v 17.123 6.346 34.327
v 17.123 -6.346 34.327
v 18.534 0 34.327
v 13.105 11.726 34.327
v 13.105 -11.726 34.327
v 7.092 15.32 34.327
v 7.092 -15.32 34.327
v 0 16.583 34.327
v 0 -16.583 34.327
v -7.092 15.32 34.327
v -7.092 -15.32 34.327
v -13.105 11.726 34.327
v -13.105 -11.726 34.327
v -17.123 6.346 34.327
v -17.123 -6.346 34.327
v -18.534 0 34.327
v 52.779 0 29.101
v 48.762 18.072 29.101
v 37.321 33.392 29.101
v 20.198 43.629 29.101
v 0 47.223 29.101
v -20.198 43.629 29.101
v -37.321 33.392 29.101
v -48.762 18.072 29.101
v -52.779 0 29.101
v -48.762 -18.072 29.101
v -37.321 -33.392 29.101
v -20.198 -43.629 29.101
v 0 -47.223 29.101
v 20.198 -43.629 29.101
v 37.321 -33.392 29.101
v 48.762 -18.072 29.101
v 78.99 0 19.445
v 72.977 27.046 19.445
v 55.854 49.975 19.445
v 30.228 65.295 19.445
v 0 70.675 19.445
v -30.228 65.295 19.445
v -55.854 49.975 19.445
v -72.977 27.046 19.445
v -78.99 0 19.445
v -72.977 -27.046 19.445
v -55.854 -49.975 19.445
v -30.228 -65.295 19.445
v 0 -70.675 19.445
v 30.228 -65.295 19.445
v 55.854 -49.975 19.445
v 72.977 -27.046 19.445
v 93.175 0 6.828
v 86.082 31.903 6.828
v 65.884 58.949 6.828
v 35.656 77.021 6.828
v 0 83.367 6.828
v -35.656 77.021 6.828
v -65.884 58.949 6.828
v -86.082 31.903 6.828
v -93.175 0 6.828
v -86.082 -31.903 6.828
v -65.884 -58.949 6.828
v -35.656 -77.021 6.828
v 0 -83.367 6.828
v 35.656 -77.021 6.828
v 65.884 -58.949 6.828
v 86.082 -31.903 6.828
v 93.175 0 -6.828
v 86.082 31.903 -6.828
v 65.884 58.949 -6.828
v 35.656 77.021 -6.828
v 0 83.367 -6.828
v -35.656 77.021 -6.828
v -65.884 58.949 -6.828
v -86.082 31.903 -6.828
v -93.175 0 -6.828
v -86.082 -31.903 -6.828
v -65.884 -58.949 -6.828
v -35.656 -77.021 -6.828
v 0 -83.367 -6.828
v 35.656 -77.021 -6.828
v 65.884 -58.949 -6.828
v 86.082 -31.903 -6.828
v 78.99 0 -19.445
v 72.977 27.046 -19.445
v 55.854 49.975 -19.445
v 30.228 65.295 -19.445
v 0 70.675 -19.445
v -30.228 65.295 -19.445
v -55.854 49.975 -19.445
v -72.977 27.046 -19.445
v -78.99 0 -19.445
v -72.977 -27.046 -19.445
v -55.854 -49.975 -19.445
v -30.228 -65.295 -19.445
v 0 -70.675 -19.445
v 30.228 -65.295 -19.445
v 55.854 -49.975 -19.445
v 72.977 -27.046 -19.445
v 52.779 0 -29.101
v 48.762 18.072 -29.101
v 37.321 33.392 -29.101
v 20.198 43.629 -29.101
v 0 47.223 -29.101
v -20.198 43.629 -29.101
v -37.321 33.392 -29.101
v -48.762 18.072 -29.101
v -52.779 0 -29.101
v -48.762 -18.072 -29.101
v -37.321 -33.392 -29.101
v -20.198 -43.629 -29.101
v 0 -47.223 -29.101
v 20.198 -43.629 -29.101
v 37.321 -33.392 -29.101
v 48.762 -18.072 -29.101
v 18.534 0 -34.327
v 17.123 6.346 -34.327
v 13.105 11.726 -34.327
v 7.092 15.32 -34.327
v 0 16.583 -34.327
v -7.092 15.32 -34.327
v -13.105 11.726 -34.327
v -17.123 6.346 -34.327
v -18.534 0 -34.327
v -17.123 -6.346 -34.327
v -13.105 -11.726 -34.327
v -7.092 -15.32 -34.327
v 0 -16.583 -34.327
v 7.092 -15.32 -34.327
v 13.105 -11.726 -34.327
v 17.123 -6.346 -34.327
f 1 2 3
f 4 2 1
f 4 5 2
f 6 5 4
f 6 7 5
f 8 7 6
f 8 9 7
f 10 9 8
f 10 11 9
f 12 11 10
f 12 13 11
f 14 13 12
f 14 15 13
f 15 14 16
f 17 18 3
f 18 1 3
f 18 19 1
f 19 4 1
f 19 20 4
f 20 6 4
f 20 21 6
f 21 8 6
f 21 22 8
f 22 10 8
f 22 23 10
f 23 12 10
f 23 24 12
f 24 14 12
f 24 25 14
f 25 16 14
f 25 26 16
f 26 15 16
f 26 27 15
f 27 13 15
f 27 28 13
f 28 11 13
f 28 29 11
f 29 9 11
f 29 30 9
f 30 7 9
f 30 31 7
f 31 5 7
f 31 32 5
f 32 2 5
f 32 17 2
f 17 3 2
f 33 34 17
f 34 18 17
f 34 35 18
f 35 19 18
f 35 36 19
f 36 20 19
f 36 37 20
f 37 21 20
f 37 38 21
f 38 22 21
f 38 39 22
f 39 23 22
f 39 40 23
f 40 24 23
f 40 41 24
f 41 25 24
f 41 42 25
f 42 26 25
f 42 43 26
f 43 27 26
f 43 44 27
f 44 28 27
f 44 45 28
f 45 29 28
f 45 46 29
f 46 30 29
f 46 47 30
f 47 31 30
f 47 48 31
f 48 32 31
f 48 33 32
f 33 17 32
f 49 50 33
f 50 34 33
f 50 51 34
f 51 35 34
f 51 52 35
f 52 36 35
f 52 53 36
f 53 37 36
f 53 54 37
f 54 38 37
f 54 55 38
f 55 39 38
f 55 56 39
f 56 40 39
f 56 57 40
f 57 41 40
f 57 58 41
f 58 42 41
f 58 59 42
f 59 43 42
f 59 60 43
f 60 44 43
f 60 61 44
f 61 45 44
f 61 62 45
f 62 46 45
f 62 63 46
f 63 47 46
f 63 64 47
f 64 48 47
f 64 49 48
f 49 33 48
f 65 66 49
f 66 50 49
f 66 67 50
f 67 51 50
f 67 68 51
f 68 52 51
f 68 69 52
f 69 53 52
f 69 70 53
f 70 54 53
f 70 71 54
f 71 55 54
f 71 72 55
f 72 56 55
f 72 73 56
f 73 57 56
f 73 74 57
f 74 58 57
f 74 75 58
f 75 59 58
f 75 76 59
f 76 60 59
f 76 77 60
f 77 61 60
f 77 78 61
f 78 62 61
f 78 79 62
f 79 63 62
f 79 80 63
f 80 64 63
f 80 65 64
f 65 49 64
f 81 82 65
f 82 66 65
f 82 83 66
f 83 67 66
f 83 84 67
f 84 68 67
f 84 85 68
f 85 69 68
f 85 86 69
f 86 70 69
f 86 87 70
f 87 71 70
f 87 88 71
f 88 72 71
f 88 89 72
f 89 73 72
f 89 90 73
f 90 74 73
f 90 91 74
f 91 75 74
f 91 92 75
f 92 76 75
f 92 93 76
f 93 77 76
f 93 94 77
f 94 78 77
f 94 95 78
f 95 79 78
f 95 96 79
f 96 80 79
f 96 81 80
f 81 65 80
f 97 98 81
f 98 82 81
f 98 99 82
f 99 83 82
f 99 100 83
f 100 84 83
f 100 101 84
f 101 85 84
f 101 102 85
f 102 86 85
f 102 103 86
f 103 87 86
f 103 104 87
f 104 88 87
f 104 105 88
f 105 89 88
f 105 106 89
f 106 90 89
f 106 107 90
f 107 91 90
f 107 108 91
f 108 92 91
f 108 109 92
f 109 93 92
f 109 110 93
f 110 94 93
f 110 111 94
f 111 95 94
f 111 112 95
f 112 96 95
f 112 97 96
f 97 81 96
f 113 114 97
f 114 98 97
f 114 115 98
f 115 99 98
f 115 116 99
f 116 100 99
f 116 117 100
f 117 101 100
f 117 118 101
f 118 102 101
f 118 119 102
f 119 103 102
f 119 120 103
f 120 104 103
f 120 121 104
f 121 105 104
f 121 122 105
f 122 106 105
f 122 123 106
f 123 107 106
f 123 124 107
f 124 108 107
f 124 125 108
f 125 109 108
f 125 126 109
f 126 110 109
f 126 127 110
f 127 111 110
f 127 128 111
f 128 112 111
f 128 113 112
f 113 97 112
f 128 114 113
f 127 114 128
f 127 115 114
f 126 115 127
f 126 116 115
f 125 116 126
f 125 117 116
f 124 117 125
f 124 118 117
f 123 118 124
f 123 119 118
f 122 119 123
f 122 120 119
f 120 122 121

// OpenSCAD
// Generated by SolidPython 1.0.1 on 2020-07-29 00:46:54


scale(v = [19, 17, 7]) {
	sphere(r = 5);
}
/***********************************************
*********      SolidPython code:      **********
************************************************
 
# import packages: SolidPython
from solid import *
from solid.utils import *
from itertools import chain, combinations, permutations


class Resize:

    def __init__(self, scad_file):
        self.scad_file = scad_file
        #self.scad_file = import_scad(scad_file)
        # cone/cylinder param:
        self.r1 = 0
        self.r2 = 0
        self.h = 0
        # rectangular prism param:
        self.w = 0
        self.l = 0
        # ellipse param:
        self.r = 0

    # import OpenScad code (file name corresponds to shape)


    # classify shape + parameters
    def assign(self, param1, param2, param3):
        if self.scad_file == 'cone.scad':
            self.r1 = param1
            self.r2 = param2
            self.h = param3
        elif self.scad_file == 'cylinder.scad':
            self.r1 = param1
            self.r2 = param2
            self.h = param3
        elif self.scad_file == 'rectangularPrism.scad':
            self.h = param1
            self.l = param2
            self.w = param3
        else:
            self.r = param1
            self.h = param2

    # resize parameters
    def iterate(self):
        x = range(3, 20, 2)
        i = 1
        if self.scad_file == 'cone.scad':
            tempList = list(permutations(x, 2))
            for temp in tempList:
                param1 = temp[0]
                param2 = temp[1]
                filepath = 'produced_scad_files/' + 'cone' + str(param1) + '_' + str(param2) + '_' + '.scad'
                scad_render_to_file(cylinder(h=param1, r1=param2, r2=0), filepath)

        elif self.scad_file == 'cylinder.scad':
            tempList = list(permutations(x, 3))
            for temp in tempList:
                param1 = temp[0]
                param2 = temp[1]
                filepath = 'produced_scad_files/' + 'cylinder' + str(param1) + '_' + str(param2) + '_' + '.scad'
                scad_render_to_file(cylinder(h=param1, r1=param2, r2=param2), filepath)

        elif self.scad_file == 'rectangularPrism.scad':
            tempList = list(permutations(x, 3))
            for temp in tempList:
                param1 = temp[0]
                param2 = temp[1]
                param3 = temp[2]
                filepath = 'produced_scad_files/' + 'rectangularPrism' + str(param1) + '_' + str(param2) + '_' + str(
                    param3) + '.scad'
                scad_render_to_file(cube(size=(param1, param2, param3)), filepath)

        elif self.scad_file == 'ellipse.scad':
            tempList = list(permutations(x, 4))
            for temp in tempList:
                param1 = temp[0]
                param2 = temp[1]
                param3 = temp[2]
                param4 = temp[3]
                filepath = 'produced_scad_files/' + 'ellipse' + str(param1) + '_' + str(param2) + '_' + str(param3) + '_' + str(param4) + '.scad'
                scad_render_to_file(scale([param1, param2, param3])(sphere(r=param4)), filepath)

    def render_to_scadfile(self):
        scad_render_to_file(scad, 'example.scad') 
 
************************************************/
